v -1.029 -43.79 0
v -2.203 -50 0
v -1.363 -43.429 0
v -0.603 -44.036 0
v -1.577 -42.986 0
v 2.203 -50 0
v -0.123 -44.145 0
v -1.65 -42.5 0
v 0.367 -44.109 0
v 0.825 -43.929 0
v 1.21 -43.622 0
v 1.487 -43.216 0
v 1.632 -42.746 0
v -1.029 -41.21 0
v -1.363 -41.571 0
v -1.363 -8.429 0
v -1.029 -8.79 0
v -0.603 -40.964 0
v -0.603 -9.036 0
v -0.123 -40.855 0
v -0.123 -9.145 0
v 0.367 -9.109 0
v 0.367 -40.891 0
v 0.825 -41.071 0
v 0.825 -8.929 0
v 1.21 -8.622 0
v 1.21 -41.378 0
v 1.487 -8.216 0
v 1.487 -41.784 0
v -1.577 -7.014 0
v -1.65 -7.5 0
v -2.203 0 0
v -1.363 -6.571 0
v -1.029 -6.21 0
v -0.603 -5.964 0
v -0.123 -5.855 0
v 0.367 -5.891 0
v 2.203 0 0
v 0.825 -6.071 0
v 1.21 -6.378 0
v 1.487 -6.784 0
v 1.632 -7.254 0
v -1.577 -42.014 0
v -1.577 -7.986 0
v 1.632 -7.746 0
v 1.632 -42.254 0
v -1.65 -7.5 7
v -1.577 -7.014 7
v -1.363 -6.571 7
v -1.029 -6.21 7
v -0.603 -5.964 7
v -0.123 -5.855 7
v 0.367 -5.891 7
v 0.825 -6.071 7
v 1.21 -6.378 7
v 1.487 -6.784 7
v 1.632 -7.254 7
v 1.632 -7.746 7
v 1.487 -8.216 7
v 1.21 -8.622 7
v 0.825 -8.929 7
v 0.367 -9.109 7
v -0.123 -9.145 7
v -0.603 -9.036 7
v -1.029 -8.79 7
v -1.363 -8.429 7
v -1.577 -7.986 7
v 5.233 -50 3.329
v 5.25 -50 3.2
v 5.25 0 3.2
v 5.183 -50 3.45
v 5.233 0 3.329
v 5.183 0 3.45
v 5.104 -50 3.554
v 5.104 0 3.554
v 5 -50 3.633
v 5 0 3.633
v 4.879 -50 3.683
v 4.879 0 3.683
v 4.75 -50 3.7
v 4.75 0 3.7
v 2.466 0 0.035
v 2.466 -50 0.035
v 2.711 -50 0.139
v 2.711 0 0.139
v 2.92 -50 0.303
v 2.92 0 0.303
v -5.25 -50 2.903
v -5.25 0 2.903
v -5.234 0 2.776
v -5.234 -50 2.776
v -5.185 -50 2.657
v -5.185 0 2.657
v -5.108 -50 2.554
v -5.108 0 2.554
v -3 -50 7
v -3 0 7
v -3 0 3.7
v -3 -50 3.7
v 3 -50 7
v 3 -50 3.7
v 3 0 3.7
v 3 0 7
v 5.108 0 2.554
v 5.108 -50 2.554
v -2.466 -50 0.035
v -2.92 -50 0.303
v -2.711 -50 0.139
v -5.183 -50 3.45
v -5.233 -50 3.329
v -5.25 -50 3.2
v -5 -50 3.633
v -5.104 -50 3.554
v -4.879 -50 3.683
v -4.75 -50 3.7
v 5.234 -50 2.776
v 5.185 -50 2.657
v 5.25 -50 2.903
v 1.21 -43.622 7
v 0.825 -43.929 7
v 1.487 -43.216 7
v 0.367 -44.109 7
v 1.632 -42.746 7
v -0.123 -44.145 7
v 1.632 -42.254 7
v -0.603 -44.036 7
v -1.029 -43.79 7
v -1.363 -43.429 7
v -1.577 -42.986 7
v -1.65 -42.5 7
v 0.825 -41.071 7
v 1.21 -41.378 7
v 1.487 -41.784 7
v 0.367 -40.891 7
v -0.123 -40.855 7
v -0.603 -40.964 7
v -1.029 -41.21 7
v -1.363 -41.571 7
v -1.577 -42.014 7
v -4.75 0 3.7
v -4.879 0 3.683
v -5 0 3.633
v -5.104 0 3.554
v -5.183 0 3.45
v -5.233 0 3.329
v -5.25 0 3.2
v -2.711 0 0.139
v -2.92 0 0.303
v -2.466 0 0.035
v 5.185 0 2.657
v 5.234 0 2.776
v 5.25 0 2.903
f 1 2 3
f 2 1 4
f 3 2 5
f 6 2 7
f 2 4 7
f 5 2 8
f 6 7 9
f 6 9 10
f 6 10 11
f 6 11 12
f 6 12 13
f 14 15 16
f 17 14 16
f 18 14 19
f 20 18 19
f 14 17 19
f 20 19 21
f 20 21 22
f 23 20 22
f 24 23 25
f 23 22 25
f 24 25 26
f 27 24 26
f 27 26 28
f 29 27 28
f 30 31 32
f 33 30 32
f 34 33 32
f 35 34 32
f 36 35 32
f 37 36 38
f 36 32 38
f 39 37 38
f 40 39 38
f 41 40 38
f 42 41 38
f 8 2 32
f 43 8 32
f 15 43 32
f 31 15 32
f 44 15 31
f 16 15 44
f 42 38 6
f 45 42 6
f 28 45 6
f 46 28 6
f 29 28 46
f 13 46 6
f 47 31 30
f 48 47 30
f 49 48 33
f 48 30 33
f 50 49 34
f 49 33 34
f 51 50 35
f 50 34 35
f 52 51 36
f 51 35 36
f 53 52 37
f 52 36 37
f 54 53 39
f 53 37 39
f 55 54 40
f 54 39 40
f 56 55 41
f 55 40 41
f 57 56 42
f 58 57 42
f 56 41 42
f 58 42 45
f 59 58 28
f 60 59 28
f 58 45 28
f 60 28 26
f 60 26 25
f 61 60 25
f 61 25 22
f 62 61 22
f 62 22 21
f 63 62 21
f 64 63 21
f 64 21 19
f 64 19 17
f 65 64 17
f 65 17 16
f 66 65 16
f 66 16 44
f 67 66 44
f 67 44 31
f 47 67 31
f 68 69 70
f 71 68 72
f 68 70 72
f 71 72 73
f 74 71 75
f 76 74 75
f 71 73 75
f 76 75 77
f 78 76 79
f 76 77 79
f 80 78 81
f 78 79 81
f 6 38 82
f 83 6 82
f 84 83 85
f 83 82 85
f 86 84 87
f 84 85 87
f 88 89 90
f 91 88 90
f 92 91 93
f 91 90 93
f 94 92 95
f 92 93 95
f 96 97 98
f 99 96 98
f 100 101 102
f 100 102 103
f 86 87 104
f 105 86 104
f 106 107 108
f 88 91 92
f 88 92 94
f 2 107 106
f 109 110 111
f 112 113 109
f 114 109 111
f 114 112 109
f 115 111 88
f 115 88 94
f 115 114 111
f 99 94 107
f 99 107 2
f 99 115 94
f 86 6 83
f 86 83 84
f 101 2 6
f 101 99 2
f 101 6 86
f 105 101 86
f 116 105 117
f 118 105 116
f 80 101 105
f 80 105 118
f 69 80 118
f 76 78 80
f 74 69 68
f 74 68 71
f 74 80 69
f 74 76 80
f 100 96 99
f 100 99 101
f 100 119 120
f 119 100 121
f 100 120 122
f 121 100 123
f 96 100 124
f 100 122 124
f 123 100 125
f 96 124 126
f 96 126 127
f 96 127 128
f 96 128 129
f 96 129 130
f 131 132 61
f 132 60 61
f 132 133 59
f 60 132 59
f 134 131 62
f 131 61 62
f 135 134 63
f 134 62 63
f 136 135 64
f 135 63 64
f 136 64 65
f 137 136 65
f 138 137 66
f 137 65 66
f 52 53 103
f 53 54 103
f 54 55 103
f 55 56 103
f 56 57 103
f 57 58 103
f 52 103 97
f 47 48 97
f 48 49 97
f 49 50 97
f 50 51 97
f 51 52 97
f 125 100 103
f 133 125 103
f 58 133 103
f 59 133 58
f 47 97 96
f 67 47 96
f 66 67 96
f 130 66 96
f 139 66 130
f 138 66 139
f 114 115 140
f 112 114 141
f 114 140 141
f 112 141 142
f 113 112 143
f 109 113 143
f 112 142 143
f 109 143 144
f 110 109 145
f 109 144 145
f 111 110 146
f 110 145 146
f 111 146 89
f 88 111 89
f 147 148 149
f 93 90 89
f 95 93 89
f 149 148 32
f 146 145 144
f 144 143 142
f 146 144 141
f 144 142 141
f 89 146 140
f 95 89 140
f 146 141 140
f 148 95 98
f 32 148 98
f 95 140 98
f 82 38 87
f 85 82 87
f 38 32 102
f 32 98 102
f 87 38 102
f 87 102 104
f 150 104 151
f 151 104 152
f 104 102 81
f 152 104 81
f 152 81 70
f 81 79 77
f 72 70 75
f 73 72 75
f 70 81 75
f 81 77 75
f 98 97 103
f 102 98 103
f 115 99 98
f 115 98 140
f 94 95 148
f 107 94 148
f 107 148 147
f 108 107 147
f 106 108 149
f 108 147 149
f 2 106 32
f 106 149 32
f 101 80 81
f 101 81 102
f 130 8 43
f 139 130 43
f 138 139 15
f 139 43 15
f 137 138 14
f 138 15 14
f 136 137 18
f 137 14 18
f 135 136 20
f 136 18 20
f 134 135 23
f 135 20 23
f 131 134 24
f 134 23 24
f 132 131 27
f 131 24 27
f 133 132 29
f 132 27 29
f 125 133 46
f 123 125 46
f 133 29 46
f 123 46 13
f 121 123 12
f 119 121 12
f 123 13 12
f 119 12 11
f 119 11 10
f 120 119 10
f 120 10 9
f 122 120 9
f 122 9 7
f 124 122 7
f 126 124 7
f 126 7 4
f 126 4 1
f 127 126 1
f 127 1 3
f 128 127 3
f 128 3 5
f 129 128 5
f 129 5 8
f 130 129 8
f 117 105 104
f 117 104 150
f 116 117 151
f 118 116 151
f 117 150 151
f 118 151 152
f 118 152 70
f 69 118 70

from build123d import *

# Parameters (mm, degrees)
F1_DEPTH = 50
F3_D     = 3.3


with BuildPart() as f1:
    # F0 (on Front) → F1 (new body)
    with BuildSketch(Plane.XZ):
        with BuildLine():
            ThreePointArc((-2.9195071176, 0.3029216067), (-2.5916918532, 0.0788381268), (-2.2025121988, 0))
            Line((-2.2025121988, 0), (2.2025121988, 0))
            ThreePointArc((2.2025121988, 0), (2.5916918532, 0.0788381268), (2.9195071176, 0.3029216067))
            Line((2.9195071176, 0.3029216067), (5.1084974594, 2.5544545297))
            ThreePointArc((5.1084974594, 2.5544545297), (5.2132756899, 2.7149096091), (5.25, 2.9029937263))
            Line((5.25, 2.9029937263), (5.25, 3.2))
            ThreePointArc((5.25, 3.2), (5.1035533906, 3.5535533906), (4.75, 3.7))
            Line((4.75, 3.7), (3, 3.7))
            Line((3, 3.7), (3, 7))
            Line((3, 7), (-3, 7))
            Line((-3, 7), (-3, 3.7))
            Line((-3, 3.7), (-4.75, 3.7))
            ThreePointArc((-4.75, 3.7), (-5.1035533906, 3.5535533906), (-5.25, 3.2))
            Line((-5.25, 3.2), (-5.25, 2.9029937263))
            ThreePointArc((-5.25, 2.9029937263), (-5.2132756899, 2.7149096091), (-5.1084974594, 2.5544545297))
            Line((-5.1084974594, 2.5544545297), (-2.9195071176, 0.3029216067))
        make_face()
    extrude(amount=F1_DEPTH)

    # F3 (through all)
    with Locations(Plane.XY.offset(7)):
        with Locations((0, -42.5), (0, -7.5)):
            Hole(F3_D / 2)


solid = f1.part
